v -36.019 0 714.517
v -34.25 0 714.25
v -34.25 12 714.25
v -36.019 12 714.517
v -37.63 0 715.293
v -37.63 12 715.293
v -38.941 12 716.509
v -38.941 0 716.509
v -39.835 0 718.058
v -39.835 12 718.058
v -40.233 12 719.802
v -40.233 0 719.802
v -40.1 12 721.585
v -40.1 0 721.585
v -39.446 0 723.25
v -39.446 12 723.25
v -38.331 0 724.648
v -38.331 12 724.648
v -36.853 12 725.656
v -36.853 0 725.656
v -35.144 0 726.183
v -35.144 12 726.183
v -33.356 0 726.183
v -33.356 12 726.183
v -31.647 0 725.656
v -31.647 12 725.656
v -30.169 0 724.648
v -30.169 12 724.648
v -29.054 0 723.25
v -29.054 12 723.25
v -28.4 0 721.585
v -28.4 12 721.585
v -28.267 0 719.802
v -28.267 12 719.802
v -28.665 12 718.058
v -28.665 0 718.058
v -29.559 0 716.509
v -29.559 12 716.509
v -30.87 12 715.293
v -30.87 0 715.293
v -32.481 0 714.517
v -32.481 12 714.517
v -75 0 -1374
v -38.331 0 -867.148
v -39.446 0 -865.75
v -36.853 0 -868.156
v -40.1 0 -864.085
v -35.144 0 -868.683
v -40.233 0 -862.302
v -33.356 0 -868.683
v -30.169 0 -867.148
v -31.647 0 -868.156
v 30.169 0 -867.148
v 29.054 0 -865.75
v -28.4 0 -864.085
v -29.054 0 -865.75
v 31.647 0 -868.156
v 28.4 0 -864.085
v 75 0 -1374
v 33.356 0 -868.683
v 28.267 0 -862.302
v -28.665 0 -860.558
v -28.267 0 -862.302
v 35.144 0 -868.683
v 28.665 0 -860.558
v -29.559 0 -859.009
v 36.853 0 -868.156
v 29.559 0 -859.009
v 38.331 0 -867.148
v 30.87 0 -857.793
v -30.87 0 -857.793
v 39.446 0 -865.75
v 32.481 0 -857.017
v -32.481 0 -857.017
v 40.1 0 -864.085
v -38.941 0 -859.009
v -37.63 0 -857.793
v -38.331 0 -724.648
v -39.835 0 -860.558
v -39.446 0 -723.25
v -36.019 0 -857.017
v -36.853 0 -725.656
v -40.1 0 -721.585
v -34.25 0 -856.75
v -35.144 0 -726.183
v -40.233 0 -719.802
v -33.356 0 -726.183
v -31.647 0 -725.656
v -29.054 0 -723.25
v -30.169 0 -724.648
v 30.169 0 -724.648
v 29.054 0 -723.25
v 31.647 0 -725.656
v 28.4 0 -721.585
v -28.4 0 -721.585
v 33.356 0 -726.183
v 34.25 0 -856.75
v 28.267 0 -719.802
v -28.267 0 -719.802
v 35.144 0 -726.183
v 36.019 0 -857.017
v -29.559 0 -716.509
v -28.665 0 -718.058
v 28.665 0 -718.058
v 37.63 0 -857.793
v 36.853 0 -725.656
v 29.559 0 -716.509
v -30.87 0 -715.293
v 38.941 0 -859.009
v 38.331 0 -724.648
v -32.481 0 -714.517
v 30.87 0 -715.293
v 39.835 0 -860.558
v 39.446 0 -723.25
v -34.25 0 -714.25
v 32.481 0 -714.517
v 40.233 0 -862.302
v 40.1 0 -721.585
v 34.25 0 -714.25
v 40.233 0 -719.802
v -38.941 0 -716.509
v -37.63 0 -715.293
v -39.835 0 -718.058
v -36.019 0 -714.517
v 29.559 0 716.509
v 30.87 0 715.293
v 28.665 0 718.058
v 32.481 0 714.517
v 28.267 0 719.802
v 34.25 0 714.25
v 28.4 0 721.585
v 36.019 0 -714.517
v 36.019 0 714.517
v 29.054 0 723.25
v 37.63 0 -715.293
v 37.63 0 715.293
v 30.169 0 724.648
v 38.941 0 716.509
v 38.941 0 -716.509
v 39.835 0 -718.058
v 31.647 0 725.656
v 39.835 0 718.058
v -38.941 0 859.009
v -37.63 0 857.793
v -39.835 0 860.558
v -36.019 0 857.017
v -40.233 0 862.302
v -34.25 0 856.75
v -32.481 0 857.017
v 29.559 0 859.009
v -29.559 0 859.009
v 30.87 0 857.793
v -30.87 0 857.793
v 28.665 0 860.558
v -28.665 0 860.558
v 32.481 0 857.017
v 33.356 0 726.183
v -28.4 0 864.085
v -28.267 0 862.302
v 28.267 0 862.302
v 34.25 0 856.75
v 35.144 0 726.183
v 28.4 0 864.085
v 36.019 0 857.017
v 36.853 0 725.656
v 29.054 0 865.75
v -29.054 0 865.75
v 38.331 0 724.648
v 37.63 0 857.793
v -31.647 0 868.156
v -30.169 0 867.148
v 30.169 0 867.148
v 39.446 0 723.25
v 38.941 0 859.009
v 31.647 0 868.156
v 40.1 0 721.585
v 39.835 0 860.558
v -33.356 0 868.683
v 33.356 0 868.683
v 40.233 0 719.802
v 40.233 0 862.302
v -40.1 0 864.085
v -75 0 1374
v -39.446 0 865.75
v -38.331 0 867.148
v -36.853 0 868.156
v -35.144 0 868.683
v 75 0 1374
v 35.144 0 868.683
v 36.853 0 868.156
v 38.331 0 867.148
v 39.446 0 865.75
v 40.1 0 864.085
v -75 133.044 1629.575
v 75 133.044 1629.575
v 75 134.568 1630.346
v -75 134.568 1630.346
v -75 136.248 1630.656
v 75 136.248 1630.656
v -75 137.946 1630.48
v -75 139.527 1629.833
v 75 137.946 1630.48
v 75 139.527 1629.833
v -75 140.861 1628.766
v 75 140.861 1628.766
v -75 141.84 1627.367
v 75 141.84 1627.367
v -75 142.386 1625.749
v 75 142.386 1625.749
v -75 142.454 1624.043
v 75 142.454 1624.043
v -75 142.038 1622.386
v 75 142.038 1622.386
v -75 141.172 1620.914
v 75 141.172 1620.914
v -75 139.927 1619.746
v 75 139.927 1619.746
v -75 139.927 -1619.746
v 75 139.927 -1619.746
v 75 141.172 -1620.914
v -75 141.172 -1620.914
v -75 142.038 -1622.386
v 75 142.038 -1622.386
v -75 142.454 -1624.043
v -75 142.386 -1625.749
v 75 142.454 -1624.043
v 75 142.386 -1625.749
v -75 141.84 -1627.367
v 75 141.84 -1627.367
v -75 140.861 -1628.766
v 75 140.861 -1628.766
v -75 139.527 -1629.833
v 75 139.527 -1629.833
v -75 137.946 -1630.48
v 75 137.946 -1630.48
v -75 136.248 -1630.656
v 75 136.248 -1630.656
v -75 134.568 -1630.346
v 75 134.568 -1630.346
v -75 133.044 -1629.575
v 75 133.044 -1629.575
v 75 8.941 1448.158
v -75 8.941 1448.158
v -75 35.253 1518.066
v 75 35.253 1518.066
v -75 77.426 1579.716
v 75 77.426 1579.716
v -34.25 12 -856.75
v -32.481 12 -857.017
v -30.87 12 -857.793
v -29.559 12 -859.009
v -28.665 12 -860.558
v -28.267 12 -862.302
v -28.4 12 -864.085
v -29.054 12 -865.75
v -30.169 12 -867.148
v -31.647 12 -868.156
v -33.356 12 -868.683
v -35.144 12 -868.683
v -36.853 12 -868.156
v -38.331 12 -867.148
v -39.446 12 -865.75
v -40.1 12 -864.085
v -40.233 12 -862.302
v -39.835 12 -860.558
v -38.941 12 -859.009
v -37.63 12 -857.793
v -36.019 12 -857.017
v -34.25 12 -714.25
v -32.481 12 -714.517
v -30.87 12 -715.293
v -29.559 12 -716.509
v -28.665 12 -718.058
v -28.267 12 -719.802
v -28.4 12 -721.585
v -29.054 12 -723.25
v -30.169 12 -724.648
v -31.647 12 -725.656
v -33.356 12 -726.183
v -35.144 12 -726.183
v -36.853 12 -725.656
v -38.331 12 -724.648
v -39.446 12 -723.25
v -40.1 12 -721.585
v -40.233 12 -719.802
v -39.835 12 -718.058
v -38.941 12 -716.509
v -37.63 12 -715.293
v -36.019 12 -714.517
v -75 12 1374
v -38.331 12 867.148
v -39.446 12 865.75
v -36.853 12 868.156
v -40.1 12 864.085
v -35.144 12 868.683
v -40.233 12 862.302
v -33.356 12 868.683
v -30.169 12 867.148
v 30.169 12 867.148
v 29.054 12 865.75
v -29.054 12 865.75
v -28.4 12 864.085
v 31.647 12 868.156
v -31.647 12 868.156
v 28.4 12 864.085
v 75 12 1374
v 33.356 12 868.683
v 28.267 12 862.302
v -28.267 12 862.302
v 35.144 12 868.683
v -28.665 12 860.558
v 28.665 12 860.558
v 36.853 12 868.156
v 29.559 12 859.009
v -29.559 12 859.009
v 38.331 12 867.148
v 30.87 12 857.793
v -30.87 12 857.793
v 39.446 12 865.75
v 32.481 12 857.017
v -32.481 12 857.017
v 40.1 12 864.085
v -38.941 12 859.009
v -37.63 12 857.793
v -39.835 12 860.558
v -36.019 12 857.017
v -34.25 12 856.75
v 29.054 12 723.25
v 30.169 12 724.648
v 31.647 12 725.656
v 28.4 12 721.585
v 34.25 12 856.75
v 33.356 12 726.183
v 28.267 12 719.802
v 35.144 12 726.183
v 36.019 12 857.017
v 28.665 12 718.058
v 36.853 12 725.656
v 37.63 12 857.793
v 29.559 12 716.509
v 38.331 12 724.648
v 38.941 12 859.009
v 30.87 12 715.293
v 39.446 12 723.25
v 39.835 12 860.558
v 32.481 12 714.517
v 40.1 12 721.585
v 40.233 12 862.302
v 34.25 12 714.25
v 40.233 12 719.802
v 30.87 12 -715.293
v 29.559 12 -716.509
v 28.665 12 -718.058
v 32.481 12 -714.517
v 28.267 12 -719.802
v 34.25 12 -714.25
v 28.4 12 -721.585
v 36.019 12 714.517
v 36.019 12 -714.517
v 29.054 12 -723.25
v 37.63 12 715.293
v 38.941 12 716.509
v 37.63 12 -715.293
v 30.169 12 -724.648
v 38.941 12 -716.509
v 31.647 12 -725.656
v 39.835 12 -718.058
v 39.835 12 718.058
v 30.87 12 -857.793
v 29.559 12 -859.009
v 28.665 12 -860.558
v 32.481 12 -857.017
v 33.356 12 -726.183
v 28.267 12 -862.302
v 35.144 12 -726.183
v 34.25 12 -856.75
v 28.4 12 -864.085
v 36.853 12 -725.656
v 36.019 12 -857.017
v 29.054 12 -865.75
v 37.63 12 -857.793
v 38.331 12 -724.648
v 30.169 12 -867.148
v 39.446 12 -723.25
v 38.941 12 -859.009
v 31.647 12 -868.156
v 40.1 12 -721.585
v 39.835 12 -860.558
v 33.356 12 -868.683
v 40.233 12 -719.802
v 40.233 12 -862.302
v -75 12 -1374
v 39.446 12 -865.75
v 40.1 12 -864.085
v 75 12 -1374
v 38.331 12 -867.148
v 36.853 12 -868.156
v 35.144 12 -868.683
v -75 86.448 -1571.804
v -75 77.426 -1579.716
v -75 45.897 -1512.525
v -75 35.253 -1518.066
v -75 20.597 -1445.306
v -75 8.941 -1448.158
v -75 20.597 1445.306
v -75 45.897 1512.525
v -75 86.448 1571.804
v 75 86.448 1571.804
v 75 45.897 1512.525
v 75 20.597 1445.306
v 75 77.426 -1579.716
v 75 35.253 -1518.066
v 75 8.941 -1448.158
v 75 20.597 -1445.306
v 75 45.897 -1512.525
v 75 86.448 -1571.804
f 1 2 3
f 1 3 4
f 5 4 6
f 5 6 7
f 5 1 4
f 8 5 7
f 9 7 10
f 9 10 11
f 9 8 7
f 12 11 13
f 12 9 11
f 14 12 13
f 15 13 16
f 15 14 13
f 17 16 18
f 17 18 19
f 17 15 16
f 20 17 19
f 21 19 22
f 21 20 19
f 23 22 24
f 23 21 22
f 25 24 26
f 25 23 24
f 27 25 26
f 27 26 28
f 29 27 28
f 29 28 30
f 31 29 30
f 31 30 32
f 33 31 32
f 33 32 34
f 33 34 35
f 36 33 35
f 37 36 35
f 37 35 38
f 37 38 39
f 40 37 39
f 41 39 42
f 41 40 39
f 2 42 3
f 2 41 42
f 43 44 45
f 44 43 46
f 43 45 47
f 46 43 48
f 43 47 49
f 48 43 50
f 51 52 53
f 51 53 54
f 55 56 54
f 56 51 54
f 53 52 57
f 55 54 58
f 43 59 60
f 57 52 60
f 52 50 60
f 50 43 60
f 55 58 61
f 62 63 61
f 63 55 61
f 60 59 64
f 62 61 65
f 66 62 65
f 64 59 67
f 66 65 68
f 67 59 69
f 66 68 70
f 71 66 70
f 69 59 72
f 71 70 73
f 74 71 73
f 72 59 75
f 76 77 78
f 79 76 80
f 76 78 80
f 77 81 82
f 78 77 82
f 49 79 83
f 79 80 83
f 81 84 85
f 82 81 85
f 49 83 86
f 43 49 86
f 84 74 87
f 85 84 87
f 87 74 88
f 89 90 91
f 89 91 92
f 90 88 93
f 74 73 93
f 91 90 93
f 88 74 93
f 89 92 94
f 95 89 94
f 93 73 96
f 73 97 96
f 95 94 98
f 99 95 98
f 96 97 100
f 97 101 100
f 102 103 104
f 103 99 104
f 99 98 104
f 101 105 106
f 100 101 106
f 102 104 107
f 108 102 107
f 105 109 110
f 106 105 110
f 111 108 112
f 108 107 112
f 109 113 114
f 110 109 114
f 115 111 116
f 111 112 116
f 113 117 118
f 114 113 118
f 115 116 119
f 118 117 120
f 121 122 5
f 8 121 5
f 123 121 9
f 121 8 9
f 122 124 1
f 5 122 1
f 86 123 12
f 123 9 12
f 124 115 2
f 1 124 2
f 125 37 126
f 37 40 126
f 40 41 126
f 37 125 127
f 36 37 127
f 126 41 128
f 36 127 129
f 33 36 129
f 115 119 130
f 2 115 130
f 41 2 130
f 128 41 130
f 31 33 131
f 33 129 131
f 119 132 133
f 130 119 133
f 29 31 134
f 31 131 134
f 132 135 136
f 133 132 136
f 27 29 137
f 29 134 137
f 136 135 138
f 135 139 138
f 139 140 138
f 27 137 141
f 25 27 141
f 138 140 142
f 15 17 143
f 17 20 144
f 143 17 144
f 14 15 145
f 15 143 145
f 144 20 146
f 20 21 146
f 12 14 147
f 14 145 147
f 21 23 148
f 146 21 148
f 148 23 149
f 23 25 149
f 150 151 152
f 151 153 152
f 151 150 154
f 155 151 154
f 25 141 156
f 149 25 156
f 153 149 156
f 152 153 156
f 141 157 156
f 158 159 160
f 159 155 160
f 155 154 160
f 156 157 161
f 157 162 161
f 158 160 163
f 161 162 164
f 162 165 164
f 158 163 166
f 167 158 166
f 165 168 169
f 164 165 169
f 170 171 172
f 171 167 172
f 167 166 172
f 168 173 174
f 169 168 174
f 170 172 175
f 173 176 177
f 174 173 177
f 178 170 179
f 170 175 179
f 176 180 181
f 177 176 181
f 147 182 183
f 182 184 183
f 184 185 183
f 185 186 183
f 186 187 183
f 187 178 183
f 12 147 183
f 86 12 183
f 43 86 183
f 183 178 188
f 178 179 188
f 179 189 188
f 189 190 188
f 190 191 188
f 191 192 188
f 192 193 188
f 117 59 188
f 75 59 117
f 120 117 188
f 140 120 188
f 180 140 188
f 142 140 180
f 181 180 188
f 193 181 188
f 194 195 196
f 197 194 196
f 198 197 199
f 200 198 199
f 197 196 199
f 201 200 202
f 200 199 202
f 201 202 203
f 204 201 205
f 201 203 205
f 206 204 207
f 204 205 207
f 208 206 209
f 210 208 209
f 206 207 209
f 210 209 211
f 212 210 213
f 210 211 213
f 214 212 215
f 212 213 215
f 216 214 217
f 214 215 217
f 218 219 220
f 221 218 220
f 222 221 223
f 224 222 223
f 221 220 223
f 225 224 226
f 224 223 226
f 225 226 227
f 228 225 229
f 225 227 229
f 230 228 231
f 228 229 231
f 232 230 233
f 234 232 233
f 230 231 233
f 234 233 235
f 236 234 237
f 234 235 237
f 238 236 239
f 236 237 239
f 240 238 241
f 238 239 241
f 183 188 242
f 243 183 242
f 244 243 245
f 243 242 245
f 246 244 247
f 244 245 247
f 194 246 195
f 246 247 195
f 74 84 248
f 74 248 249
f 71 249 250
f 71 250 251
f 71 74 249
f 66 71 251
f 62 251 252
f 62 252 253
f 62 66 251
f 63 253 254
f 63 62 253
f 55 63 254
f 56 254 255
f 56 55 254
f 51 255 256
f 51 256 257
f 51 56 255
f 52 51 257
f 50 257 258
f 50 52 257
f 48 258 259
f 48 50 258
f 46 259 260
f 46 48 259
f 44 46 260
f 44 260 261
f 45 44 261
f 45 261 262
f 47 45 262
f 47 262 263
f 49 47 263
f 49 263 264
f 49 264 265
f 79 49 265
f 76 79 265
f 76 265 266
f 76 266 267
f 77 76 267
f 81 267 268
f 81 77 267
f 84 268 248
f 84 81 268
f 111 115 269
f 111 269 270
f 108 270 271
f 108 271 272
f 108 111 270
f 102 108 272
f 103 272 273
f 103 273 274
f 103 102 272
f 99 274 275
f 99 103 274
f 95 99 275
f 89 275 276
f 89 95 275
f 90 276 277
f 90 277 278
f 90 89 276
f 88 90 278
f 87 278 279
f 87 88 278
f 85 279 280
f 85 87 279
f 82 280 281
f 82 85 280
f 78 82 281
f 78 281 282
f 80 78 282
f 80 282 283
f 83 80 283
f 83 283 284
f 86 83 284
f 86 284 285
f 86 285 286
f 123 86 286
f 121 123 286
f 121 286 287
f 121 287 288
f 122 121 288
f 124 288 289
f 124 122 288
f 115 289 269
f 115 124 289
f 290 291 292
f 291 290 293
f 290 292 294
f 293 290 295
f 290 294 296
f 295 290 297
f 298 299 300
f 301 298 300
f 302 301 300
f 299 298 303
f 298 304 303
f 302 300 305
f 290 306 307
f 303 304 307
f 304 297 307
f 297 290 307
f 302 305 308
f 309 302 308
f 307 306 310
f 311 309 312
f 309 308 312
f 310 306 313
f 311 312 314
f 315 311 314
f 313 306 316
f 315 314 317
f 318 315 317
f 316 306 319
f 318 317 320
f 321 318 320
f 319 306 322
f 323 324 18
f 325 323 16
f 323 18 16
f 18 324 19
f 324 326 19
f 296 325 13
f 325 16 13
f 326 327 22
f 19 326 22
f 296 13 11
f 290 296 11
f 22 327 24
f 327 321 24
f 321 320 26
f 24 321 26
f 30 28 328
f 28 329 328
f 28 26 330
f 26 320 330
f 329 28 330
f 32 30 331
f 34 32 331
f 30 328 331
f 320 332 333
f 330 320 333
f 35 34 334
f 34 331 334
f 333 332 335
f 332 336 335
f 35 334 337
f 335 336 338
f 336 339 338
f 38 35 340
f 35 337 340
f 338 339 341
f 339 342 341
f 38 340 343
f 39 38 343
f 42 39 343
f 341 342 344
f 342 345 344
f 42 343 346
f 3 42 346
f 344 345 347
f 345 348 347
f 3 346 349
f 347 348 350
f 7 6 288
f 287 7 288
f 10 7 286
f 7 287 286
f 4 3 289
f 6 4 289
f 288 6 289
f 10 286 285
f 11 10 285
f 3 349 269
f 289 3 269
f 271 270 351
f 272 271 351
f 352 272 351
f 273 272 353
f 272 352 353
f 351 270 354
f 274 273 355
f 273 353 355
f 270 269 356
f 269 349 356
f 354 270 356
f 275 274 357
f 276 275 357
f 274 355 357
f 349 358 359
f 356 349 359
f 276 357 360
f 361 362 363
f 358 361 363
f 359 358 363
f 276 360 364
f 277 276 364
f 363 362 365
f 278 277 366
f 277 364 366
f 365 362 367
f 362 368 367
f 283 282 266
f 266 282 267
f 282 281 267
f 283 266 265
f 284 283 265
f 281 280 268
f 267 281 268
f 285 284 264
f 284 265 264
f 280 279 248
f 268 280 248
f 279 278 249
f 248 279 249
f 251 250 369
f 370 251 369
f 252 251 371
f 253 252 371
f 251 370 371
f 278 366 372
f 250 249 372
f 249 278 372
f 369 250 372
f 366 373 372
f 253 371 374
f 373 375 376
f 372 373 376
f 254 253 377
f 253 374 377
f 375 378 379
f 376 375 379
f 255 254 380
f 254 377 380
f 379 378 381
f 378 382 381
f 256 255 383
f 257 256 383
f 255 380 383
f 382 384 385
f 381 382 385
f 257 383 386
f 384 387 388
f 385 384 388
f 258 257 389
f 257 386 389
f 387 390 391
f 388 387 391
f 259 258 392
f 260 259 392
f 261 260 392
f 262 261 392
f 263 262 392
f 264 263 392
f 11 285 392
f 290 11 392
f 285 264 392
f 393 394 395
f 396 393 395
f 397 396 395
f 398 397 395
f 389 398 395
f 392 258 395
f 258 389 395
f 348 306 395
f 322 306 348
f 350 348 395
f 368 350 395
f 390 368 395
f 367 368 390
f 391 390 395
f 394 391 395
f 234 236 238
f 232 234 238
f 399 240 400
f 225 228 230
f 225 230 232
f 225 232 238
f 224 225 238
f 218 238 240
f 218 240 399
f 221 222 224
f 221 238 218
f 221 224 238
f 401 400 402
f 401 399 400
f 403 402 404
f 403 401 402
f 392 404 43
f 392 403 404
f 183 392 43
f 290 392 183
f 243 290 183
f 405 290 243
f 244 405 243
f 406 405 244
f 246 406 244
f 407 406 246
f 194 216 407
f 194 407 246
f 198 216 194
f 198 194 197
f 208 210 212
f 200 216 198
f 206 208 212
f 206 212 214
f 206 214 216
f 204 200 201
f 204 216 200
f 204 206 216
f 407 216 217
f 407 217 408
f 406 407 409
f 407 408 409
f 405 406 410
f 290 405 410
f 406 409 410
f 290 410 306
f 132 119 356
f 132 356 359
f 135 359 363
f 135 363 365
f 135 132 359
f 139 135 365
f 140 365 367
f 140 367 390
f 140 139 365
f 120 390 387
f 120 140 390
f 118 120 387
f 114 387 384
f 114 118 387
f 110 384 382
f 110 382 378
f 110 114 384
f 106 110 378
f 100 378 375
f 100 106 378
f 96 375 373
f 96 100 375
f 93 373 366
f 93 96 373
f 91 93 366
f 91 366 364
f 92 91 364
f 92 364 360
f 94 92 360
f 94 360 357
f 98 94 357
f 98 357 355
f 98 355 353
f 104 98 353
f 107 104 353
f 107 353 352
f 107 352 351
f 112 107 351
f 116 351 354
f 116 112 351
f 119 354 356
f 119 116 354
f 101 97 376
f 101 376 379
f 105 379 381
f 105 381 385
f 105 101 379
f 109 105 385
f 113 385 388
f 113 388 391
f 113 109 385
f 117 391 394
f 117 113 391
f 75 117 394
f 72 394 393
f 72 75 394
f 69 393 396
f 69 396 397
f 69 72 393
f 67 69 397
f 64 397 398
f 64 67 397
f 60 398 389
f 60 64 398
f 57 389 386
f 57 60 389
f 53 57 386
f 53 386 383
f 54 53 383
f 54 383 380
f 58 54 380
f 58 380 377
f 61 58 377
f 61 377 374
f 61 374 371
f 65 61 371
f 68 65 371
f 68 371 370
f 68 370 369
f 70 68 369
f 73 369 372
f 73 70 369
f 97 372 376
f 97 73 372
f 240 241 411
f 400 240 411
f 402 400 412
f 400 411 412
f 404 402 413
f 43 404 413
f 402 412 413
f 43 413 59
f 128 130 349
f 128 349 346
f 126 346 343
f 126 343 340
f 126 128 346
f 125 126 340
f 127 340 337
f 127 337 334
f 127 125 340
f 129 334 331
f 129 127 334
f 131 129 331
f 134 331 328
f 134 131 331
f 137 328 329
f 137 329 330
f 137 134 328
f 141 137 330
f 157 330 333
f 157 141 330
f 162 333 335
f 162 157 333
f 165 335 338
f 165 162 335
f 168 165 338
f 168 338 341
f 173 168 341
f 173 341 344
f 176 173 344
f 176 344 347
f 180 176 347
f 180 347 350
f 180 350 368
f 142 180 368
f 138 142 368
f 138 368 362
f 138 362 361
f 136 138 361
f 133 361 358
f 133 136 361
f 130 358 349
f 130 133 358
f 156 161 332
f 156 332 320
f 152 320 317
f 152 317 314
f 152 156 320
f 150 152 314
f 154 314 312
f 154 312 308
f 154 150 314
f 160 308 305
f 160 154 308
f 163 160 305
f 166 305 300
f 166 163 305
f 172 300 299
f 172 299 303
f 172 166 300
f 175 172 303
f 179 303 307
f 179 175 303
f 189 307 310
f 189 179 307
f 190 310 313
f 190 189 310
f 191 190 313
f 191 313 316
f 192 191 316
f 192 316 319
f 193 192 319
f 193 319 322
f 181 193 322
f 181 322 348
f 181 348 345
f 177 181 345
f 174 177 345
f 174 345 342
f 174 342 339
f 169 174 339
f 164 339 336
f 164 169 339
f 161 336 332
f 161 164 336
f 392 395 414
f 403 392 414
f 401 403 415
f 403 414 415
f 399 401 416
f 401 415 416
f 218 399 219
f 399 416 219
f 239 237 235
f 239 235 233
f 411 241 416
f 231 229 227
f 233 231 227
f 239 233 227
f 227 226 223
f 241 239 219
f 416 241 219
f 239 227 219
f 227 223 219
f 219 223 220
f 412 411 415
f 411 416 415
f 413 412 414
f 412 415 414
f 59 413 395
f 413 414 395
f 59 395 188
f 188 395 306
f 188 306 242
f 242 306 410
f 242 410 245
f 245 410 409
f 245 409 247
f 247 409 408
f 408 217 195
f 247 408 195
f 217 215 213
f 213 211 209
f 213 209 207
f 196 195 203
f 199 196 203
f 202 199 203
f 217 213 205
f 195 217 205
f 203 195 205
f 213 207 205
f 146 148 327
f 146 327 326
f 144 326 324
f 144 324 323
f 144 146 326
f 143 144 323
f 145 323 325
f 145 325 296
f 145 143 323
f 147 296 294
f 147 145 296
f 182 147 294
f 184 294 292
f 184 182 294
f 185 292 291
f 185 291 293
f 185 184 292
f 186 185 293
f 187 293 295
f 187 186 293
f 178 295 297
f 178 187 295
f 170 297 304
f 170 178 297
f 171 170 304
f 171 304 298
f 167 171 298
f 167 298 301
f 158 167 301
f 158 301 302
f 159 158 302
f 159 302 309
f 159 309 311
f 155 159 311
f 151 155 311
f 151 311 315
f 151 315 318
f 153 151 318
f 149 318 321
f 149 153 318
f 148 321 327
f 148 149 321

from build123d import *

# Parameters (mm, degrees)
SKETCH1_W           = 150
SKETCH1_H           = 2548
SKETCH1_R           = 6
BOSS_EXTRUDE1_DEPTH = 12
BOSS_EXTRUDE2_DEPTH = 150


with BuildPart() as part:
    # Sketch1 → Boss-Extrude1 (new body)
    with BuildSketch(Plane(origin=(0, 0, 0), x_dir=(1, 0, 0), z_dir=(0, 1, 0))):
        Rectangle(SKETCH1_W, SKETCH1_H)
        with Locations(Location((-34.25, 720.25, 0), (0, 0, 270))):
            Circle(SKETCH1_R, mode=Mode.SUBTRACT)
        with Locations(Location((34.25, 720.25, 0), (0, 0, 270))):
            Circle(SKETCH1_R, mode=Mode.SUBTRACT)
        with Locations(Location((-34.25, 862.75, 0), (0, 0, 270))):
            Circle(SKETCH1_R, mode=Mode.SUBTRACT)
        with Locations(Location((34.25, 862.75, 0), (0, 0, 270))):
            Circle(SKETCH1_R, mode=Mode.SUBTRACT)
        with Locations(Location((34.25, -720.25, 0), (0, 0, 90))):
            Circle(SKETCH1_R, mode=Mode.SUBTRACT)
        with Locations(Location((-34.25, -720.25, 0), (0, 0, 90))):
            Circle(SKETCH1_R, mode=Mode.SUBTRACT)
        with Locations(Location((34.25, -862.75, 0), (0, 0, 90))):
            Circle(SKETCH1_R, mode=Mode.SUBTRACT)
        with Locations(Location((-34.25, -862.75, 0), (0, 0, 90))):
            Circle(SKETCH1_R, mode=Mode.SUBTRACT)
    extrude(amount=BOSS_EXTRUDE1_DEPTH)

    # Sketch2 → Boss-Extrude2 (add)
    with BuildSketch(Plane(origin=(75, 0, 0), x_dir=(0, 0, -1), z_dir=(1, 0, 0))):
        with BuildLine():
            Line((-1274, 0), (-1374, 0))
            ThreePointArc((-1374, 0), (-1518.065567329, 35.252620048), (-1629.575437818, 133.044151858))
            ThreePointArc((-1629.575437818, 133.044151858), (-1628.101984171, 141.400522742), (-1619.745613287, 139.927069095))
            ThreePointArc((-1619.745613287, 139.927069095), (-1512.524583971, 45.896750047), (-1374, 12))
            Line((-1374, 12), (-1274, 12))
            Line((-1274, 12), (-1274, 0))
        make_face()
        with BuildLine():
            Line((1274, 12), (1374, 12))
            ThreePointArc((1374, 12), (1512.524583971, 45.896750047), (1619.745613287, 139.927069095))
            ThreePointArc((1619.745613287, 139.927069095), (1628.101984171, 141.400522742), (1629.575437818, 133.044151858))
            ThreePointArc((1629.575437818, 133.044151858), (1518.065567329, 35.252620048), (1374, 0))
            Line((1374, 0), (1274, 0))
            Line((1274, 0), (1274, 12))
        make_face()
    extrude(amount=-BOSS_EXTRUDE2_DEPTH)


solid = part.part
